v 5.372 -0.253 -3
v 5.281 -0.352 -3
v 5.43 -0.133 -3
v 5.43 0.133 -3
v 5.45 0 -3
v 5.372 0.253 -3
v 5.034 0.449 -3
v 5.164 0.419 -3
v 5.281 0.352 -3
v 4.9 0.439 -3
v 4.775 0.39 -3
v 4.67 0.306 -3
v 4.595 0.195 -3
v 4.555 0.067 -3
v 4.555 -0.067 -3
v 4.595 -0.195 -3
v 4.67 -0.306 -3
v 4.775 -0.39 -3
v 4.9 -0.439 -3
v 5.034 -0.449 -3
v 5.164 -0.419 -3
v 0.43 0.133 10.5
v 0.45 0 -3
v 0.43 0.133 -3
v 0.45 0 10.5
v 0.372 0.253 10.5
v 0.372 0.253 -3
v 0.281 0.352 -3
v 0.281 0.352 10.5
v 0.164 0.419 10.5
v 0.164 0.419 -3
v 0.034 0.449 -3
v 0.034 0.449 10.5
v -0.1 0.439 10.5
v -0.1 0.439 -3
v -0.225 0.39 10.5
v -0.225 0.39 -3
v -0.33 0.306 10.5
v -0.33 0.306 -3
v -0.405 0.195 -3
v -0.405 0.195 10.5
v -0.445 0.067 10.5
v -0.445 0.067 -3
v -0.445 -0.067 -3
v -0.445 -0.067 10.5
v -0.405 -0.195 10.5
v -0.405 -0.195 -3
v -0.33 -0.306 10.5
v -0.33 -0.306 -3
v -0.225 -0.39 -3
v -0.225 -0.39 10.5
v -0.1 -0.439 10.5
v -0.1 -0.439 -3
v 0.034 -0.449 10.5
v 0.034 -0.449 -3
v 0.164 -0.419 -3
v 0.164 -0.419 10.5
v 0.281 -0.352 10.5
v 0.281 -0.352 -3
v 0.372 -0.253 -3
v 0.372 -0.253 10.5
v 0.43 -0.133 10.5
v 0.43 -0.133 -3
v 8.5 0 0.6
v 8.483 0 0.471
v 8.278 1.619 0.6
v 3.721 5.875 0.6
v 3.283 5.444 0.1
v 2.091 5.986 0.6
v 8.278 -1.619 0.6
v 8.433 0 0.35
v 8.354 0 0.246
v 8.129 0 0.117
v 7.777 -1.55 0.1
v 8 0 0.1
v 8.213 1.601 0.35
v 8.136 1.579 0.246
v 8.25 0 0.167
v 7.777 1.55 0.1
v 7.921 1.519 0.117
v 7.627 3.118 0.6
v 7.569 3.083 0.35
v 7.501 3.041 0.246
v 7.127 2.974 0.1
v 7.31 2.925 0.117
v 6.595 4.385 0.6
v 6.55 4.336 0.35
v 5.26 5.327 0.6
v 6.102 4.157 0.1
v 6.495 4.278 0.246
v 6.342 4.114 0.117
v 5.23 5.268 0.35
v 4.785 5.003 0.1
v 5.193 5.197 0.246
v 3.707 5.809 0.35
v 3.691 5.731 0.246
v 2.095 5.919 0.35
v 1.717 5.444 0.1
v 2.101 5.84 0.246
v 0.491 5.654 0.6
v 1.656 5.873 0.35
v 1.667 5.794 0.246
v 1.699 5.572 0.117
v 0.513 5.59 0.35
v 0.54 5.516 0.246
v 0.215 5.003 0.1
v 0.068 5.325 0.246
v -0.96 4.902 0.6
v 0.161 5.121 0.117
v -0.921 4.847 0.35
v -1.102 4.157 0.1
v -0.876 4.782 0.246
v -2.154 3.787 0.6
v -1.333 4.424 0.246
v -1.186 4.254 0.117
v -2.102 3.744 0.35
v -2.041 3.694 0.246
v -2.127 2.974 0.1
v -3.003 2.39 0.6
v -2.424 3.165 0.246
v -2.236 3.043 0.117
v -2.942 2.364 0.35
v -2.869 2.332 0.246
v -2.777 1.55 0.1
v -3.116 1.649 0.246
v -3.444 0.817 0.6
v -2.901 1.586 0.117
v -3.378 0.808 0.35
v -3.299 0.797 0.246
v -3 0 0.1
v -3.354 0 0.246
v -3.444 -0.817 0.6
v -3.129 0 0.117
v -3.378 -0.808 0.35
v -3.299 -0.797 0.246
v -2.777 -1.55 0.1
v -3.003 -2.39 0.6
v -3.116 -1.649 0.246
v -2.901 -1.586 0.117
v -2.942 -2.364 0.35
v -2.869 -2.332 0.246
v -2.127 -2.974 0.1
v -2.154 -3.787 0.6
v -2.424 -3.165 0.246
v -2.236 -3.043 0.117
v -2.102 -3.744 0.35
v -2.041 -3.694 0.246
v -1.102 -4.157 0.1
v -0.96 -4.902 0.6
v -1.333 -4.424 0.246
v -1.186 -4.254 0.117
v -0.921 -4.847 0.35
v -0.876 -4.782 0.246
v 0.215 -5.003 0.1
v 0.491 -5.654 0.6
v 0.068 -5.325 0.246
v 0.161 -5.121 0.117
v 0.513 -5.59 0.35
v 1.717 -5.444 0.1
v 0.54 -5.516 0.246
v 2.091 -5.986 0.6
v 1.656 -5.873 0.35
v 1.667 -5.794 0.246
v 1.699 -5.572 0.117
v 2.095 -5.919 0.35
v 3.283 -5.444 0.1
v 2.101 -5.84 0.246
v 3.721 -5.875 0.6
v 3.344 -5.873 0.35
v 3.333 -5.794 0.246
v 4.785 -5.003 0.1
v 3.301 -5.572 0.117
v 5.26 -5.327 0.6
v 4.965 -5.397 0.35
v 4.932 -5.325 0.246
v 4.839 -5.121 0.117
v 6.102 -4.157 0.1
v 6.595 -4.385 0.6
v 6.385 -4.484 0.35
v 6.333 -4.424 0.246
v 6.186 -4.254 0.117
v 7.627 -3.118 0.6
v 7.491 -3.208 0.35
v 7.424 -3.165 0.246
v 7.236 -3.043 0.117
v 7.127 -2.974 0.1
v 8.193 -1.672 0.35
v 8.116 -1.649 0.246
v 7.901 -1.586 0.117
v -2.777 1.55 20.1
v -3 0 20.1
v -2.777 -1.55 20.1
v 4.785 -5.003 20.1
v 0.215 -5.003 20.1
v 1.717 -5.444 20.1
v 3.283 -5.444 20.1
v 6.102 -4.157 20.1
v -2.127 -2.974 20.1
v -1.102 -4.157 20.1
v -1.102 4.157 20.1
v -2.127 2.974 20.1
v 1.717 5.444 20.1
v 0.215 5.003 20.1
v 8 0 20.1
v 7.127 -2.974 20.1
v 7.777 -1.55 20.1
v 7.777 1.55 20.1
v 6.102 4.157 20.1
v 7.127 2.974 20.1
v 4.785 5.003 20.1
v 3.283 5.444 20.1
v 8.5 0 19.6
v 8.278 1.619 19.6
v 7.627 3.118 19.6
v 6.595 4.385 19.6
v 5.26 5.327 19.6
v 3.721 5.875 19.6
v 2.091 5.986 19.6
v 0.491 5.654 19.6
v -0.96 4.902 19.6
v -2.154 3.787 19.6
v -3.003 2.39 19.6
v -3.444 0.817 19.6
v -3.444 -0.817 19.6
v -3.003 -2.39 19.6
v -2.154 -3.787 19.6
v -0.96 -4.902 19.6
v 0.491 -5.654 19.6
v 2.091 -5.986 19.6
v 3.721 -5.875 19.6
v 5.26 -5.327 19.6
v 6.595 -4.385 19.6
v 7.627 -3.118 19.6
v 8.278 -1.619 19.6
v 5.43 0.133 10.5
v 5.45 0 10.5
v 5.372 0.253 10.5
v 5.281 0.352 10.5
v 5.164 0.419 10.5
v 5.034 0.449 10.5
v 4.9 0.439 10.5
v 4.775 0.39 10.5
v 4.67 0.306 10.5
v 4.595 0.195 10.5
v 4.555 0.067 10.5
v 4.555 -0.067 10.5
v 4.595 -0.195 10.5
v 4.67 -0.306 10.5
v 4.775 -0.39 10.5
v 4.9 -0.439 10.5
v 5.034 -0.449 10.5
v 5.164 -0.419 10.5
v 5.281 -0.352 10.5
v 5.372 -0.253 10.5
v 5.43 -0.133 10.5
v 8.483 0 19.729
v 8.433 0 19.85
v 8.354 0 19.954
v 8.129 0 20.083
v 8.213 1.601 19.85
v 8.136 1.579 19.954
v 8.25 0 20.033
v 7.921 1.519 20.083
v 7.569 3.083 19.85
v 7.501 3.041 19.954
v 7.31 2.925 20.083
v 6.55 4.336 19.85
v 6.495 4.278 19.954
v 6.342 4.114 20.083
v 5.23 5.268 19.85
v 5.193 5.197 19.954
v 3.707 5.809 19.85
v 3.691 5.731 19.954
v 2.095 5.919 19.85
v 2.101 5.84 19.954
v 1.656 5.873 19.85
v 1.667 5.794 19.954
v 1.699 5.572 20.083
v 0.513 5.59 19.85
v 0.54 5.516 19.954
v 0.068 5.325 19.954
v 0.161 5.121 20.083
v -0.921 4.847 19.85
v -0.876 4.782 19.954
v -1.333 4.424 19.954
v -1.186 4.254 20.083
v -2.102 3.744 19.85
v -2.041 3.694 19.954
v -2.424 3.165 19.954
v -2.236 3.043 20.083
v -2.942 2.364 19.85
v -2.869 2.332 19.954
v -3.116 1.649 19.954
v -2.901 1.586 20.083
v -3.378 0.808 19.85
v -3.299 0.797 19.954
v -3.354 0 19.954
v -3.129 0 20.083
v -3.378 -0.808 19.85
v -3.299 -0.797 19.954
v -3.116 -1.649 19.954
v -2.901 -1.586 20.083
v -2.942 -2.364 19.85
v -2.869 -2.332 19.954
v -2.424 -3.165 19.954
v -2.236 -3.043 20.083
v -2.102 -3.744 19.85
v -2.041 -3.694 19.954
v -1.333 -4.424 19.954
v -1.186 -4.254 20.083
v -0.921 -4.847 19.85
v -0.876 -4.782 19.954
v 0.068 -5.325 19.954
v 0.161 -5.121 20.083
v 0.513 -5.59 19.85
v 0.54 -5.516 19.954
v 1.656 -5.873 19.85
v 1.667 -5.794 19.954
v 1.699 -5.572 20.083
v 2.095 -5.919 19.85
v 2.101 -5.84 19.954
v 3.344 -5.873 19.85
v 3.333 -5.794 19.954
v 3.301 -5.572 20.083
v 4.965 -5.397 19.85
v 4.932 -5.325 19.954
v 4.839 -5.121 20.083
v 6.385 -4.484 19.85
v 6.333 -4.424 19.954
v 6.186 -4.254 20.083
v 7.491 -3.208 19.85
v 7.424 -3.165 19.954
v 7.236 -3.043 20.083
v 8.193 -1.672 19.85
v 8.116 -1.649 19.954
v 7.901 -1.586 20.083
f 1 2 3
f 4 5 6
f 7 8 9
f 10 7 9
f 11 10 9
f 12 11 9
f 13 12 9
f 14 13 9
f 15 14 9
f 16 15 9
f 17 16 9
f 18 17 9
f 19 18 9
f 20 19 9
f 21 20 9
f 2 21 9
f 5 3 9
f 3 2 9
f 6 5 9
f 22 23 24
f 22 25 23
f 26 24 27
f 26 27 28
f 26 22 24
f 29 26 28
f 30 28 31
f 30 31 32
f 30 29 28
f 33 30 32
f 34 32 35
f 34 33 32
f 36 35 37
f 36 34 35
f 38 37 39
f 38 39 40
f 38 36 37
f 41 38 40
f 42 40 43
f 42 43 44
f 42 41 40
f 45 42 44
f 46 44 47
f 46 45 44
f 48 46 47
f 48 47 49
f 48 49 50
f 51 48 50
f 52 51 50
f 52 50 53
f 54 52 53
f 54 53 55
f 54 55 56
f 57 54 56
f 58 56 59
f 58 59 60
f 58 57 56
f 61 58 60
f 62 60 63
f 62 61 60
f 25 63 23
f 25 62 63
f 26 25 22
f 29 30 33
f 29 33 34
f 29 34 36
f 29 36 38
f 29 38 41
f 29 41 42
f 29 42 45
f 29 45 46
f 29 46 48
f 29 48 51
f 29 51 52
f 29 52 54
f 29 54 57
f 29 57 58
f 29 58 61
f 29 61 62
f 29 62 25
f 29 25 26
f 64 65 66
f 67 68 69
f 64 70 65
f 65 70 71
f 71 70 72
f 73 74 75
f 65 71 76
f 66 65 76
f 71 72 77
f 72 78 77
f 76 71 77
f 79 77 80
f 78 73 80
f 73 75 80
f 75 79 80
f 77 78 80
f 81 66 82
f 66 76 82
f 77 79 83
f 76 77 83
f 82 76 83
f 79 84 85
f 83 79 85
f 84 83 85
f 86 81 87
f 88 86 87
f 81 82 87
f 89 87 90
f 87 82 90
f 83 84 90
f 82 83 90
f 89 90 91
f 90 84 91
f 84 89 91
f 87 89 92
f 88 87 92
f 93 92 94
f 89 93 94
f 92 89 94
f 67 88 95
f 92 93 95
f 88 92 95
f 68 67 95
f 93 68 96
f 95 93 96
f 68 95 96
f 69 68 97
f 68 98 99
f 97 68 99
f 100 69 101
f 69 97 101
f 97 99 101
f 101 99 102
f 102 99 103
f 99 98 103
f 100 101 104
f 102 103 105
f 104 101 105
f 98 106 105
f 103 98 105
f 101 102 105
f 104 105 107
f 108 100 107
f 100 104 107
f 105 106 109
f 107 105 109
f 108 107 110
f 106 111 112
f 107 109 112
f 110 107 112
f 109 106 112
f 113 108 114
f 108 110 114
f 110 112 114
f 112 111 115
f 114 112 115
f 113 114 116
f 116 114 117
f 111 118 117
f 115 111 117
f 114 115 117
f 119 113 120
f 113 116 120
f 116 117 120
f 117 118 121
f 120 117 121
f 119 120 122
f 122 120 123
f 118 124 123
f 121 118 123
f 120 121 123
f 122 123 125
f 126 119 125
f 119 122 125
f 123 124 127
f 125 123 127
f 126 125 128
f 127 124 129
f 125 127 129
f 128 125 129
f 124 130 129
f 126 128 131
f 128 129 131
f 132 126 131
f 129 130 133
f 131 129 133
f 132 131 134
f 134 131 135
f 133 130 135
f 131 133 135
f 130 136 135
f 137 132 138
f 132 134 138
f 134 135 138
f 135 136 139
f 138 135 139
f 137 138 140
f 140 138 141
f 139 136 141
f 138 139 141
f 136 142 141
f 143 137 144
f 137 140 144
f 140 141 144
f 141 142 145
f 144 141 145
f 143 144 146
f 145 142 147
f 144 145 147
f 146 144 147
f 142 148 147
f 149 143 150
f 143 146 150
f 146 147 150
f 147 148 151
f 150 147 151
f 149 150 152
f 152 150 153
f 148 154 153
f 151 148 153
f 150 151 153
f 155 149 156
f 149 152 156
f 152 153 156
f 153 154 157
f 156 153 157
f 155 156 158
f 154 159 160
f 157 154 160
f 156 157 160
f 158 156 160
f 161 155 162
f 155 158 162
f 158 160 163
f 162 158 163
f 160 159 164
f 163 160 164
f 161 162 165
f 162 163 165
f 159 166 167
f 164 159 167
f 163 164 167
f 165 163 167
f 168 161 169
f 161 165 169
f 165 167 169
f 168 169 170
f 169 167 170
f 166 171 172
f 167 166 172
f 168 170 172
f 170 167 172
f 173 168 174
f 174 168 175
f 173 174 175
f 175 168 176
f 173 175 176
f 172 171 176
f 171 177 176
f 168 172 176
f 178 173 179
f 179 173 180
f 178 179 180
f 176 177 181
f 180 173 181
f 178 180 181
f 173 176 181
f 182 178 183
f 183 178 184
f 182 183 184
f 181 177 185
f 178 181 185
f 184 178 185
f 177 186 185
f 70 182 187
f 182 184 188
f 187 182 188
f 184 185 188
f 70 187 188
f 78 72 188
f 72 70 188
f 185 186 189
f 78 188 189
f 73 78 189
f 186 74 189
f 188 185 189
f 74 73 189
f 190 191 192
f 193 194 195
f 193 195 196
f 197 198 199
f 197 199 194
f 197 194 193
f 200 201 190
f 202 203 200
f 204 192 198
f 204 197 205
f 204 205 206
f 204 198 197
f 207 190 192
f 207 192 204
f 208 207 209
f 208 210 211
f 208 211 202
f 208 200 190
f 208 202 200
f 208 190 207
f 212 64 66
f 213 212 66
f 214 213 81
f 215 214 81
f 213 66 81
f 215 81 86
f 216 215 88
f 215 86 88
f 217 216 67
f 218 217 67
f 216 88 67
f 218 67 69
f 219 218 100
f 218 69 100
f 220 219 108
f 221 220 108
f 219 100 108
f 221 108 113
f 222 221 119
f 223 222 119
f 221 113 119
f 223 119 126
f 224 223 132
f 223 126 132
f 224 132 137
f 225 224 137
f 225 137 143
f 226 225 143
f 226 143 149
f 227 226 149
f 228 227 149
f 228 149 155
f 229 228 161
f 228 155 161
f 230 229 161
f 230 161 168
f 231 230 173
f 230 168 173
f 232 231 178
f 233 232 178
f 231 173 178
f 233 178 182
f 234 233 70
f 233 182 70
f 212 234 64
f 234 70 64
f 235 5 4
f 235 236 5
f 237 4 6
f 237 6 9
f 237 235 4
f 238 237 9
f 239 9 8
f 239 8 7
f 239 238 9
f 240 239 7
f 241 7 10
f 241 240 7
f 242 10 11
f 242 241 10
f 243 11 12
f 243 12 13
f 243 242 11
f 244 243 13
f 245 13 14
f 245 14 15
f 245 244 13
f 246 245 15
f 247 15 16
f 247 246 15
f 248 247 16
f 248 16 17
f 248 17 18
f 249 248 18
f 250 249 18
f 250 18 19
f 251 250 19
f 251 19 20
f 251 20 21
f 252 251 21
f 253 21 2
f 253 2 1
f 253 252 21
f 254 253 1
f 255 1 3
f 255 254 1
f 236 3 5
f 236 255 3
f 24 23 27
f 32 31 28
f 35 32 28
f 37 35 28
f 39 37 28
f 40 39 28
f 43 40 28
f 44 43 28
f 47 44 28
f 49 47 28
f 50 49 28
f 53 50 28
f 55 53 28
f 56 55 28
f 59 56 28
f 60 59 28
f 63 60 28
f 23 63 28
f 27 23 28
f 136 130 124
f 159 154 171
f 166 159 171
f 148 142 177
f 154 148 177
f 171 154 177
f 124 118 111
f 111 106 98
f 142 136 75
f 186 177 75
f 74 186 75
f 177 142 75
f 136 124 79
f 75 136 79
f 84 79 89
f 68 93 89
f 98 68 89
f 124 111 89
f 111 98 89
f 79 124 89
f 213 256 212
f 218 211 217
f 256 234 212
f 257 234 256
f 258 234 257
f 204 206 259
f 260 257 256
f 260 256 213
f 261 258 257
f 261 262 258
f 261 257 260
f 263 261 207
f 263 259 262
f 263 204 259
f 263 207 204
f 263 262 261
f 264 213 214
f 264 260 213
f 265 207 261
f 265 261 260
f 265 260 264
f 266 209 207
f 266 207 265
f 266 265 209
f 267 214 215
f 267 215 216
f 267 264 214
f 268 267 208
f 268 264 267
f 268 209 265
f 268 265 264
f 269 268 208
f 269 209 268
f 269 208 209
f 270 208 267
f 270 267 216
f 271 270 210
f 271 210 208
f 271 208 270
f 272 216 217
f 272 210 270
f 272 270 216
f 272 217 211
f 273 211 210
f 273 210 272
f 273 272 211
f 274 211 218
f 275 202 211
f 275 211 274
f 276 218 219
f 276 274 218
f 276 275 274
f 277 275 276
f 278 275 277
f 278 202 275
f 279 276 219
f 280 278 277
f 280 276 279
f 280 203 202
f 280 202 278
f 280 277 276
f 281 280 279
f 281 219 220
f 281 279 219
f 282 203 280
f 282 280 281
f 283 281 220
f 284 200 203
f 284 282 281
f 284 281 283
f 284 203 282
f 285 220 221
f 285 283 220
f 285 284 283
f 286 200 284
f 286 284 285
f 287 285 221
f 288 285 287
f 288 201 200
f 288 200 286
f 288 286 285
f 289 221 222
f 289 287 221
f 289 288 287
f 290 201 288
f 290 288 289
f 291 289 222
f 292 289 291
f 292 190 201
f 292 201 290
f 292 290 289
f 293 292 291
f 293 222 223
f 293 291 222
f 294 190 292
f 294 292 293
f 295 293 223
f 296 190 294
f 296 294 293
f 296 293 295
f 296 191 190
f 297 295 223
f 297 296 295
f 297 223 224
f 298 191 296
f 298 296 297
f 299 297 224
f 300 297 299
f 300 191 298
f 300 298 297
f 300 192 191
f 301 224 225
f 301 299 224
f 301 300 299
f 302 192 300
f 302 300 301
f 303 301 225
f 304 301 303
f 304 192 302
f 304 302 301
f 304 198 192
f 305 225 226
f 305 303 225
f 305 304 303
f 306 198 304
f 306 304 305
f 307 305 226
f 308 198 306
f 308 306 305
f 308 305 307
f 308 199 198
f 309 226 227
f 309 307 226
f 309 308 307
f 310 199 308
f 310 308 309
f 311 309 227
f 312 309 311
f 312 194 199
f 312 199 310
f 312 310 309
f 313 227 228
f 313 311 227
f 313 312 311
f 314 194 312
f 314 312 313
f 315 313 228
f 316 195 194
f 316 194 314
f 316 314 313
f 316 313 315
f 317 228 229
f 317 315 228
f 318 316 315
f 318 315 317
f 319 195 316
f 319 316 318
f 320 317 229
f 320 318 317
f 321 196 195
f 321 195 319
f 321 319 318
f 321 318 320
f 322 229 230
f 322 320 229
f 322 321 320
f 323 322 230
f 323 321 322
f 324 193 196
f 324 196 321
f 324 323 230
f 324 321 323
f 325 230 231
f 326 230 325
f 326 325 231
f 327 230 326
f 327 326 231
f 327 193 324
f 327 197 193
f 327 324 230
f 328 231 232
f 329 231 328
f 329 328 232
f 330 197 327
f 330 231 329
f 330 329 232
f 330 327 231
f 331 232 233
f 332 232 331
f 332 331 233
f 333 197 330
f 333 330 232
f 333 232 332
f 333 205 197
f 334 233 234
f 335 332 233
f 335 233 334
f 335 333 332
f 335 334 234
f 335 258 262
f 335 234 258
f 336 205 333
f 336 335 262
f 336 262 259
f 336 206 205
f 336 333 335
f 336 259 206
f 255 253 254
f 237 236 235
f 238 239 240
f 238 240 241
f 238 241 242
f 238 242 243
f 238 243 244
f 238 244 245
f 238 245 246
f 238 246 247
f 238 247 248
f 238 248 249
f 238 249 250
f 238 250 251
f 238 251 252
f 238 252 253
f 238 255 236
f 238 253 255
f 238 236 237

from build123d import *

# Parameters (mm, degrees)
SKETCH001_R       = 0.45
PAD001_DEPTH      = 10
PAD001_DEPTH_BACK = 3.5
SKETCH_R          = 6
PAD_DEPTH         = 20
FILLET_R          = 0.5


with BuildPart() as pad001:
    # Sketch001 → Pad001 (new body, two sides)
    with BuildSketch(Plane.XY.offset(0.5)) as pad001_sk:
        Circle(SKETCH001_R)
        with Locations((5, 0)):
            Circle(SKETCH001_R)
    extrude(amount=PAD001_DEPTH)
    extrude(pad001_sk.sketch, amount=-PAD001_DEPTH_BACK)


with BuildPart() as fillet_body:
    # Sketch → Pad (new body)
    with BuildSketch(Plane.XY.offset(0.1)):
        with Locations((2.5, 0)):
            Circle(SKETCH_R)
    extrude(amount=PAD_DEPTH)

    # Fillet
    fillet_edges = [fillet_body.edges().sort_by_distance(p)[0] for p in [
        (-3.5, 0, 0.1),
        (-3.5, 0, 20.1),
    ]]
    fillet(fillet_edges, radius=FILLET_R)


solid = Compound([pad001.part, fillet_body.part])
